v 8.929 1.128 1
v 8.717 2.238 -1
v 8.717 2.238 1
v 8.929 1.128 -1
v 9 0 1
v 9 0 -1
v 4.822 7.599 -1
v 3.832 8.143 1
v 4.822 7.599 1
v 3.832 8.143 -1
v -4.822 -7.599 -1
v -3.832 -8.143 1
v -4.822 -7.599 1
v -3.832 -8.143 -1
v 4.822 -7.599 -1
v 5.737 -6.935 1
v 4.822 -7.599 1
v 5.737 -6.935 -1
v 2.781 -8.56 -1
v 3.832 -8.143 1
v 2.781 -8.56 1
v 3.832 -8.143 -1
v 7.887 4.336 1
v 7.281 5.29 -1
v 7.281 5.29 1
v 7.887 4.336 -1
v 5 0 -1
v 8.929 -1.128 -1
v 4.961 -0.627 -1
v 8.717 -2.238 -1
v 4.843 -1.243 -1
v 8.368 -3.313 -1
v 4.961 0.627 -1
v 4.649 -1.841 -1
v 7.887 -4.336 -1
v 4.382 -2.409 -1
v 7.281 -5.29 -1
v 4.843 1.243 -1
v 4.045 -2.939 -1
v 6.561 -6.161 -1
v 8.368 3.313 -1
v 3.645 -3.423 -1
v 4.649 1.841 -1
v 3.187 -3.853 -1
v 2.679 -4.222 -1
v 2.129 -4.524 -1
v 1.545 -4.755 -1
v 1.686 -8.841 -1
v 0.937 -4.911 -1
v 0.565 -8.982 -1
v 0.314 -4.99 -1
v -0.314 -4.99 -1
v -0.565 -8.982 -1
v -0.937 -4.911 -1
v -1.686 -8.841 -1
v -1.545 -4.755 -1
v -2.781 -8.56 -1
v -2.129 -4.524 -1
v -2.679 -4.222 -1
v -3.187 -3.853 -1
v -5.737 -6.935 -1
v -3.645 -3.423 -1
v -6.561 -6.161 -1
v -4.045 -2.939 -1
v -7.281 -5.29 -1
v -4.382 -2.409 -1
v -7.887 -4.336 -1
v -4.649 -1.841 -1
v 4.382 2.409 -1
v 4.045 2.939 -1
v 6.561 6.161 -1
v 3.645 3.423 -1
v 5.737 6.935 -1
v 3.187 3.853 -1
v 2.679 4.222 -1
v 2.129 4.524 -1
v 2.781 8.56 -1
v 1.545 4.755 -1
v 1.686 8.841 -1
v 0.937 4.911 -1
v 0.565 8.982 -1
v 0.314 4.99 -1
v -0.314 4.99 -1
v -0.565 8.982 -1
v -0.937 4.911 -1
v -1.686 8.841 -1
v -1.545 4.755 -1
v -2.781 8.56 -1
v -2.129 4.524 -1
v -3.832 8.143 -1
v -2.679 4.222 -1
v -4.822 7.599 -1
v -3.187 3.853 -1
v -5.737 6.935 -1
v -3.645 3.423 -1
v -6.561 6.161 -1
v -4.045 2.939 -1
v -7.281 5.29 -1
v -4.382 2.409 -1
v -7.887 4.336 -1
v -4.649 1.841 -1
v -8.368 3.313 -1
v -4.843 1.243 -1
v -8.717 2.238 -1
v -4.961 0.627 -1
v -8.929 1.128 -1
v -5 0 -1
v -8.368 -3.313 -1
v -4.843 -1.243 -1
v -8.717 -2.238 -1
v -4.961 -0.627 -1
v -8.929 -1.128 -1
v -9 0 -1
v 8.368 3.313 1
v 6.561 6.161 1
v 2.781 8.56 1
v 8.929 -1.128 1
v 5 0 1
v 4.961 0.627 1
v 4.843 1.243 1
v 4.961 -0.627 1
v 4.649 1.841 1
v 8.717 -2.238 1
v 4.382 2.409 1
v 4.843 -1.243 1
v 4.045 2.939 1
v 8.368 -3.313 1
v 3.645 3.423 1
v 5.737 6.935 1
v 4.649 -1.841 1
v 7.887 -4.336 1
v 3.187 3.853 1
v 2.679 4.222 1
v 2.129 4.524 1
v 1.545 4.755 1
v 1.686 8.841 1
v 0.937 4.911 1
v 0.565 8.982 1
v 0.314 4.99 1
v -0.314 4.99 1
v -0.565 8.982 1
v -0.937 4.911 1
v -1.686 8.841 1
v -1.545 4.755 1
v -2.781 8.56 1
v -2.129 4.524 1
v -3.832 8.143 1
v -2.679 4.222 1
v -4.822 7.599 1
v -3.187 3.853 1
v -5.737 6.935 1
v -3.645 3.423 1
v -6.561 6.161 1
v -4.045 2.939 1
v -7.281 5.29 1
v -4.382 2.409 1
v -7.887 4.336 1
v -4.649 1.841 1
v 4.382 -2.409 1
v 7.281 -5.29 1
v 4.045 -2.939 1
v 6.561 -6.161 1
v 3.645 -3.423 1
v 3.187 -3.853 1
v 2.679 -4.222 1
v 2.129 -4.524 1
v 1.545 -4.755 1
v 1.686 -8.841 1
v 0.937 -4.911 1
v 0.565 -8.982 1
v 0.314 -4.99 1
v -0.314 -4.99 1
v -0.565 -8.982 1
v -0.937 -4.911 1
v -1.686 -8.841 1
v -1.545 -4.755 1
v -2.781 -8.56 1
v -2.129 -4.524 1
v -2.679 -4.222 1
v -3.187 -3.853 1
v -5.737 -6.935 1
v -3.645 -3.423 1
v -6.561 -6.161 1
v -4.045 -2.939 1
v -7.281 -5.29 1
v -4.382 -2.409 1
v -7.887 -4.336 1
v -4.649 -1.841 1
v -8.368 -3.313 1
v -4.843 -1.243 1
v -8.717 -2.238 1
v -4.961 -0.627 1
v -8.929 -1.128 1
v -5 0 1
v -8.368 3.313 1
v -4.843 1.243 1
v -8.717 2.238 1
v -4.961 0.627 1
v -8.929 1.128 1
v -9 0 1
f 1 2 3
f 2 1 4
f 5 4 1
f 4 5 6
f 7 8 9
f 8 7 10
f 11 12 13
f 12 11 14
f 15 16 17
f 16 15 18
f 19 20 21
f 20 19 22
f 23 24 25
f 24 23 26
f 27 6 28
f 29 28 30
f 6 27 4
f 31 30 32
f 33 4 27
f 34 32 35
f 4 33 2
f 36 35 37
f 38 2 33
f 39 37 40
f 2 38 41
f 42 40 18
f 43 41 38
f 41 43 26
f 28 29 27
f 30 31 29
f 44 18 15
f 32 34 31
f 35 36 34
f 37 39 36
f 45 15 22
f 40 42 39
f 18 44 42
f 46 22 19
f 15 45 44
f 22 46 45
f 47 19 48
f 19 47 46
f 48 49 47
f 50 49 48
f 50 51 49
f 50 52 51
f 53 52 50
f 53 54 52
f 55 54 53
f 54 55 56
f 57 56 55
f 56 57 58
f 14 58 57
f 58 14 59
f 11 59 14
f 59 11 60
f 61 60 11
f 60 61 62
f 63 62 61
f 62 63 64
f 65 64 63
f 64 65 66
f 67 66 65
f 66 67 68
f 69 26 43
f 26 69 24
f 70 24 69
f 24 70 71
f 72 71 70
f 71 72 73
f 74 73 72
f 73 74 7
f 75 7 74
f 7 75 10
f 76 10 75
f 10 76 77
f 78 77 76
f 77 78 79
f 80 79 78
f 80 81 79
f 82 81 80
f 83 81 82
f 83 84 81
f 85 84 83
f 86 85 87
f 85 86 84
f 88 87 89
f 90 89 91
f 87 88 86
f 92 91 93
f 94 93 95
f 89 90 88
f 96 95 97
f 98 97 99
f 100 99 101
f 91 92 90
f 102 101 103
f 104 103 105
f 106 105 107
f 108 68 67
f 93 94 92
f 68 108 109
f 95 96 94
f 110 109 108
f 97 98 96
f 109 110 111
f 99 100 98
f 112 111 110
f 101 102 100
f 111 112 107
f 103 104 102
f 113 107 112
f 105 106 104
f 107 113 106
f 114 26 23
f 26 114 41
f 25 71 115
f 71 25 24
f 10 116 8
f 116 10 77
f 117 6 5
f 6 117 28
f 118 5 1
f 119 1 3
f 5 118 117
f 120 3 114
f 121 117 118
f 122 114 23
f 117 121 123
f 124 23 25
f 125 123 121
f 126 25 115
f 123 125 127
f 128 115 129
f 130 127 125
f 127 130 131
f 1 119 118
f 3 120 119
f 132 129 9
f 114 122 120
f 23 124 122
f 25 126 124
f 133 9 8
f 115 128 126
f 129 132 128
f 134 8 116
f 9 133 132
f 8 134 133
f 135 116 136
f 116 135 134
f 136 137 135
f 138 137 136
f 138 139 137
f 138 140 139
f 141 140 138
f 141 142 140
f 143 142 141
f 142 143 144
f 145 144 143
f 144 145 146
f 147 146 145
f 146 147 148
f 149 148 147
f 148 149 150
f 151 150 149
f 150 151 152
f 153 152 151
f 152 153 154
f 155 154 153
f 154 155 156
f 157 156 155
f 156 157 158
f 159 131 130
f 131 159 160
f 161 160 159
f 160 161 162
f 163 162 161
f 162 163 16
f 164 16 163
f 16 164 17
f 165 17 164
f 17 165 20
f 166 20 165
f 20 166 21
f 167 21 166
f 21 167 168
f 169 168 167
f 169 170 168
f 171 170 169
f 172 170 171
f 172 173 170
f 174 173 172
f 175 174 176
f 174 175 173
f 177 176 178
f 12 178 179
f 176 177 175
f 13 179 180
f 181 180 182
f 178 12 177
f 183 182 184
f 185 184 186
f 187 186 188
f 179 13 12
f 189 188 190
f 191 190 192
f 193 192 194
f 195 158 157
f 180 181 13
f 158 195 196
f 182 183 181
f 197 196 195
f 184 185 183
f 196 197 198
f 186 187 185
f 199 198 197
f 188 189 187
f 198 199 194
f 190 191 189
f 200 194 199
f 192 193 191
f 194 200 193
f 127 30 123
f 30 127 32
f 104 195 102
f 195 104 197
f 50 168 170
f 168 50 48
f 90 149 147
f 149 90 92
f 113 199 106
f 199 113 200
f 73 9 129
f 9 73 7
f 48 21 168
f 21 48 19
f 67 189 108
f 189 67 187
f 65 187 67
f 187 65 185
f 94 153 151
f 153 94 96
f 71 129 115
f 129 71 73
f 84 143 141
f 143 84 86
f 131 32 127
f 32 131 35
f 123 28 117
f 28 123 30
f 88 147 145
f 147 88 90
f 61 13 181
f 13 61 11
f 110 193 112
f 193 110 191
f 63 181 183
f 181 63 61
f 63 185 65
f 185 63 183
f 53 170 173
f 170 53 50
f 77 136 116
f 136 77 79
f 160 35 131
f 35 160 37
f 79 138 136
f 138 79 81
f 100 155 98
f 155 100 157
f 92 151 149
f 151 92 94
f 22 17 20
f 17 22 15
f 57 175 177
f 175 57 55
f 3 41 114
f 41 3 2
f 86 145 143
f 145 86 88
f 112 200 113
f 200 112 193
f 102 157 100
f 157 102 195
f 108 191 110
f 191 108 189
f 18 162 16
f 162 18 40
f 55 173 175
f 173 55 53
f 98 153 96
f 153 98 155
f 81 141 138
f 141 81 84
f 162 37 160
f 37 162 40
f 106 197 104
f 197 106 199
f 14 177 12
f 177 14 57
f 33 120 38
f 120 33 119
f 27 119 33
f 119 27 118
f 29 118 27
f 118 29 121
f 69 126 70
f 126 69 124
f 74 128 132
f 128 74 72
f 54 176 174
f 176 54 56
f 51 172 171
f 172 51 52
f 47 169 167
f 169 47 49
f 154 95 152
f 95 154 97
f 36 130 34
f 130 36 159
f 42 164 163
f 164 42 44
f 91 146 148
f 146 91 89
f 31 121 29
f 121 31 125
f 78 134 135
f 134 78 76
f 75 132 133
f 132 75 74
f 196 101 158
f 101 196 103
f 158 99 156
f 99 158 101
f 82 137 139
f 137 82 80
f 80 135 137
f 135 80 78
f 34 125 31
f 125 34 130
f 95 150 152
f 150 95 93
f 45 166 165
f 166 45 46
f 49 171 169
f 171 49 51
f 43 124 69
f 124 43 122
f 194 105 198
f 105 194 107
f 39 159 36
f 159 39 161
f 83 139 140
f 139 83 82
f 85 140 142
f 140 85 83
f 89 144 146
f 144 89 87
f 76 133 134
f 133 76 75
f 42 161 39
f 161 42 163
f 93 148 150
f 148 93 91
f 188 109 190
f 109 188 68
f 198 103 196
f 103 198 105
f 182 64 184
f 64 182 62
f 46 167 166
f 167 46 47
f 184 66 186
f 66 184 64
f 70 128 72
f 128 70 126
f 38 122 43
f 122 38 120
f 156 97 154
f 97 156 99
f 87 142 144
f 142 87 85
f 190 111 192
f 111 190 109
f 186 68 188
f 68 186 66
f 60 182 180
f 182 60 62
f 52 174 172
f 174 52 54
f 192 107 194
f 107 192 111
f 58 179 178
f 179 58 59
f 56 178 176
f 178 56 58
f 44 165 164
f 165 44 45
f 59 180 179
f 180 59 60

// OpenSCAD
$fn = 50;


difference() {
	union() {
		translate(v = [0, 0, -1.0000000000]) {
			cylinder(h = 2, r = 9.0000000000);
		}
	}
	union() {
		translate(v = [0, 0, -100.0000000000]) {
			cylinder(h = 200, r = 5.0000000000);
		}
	}
}
